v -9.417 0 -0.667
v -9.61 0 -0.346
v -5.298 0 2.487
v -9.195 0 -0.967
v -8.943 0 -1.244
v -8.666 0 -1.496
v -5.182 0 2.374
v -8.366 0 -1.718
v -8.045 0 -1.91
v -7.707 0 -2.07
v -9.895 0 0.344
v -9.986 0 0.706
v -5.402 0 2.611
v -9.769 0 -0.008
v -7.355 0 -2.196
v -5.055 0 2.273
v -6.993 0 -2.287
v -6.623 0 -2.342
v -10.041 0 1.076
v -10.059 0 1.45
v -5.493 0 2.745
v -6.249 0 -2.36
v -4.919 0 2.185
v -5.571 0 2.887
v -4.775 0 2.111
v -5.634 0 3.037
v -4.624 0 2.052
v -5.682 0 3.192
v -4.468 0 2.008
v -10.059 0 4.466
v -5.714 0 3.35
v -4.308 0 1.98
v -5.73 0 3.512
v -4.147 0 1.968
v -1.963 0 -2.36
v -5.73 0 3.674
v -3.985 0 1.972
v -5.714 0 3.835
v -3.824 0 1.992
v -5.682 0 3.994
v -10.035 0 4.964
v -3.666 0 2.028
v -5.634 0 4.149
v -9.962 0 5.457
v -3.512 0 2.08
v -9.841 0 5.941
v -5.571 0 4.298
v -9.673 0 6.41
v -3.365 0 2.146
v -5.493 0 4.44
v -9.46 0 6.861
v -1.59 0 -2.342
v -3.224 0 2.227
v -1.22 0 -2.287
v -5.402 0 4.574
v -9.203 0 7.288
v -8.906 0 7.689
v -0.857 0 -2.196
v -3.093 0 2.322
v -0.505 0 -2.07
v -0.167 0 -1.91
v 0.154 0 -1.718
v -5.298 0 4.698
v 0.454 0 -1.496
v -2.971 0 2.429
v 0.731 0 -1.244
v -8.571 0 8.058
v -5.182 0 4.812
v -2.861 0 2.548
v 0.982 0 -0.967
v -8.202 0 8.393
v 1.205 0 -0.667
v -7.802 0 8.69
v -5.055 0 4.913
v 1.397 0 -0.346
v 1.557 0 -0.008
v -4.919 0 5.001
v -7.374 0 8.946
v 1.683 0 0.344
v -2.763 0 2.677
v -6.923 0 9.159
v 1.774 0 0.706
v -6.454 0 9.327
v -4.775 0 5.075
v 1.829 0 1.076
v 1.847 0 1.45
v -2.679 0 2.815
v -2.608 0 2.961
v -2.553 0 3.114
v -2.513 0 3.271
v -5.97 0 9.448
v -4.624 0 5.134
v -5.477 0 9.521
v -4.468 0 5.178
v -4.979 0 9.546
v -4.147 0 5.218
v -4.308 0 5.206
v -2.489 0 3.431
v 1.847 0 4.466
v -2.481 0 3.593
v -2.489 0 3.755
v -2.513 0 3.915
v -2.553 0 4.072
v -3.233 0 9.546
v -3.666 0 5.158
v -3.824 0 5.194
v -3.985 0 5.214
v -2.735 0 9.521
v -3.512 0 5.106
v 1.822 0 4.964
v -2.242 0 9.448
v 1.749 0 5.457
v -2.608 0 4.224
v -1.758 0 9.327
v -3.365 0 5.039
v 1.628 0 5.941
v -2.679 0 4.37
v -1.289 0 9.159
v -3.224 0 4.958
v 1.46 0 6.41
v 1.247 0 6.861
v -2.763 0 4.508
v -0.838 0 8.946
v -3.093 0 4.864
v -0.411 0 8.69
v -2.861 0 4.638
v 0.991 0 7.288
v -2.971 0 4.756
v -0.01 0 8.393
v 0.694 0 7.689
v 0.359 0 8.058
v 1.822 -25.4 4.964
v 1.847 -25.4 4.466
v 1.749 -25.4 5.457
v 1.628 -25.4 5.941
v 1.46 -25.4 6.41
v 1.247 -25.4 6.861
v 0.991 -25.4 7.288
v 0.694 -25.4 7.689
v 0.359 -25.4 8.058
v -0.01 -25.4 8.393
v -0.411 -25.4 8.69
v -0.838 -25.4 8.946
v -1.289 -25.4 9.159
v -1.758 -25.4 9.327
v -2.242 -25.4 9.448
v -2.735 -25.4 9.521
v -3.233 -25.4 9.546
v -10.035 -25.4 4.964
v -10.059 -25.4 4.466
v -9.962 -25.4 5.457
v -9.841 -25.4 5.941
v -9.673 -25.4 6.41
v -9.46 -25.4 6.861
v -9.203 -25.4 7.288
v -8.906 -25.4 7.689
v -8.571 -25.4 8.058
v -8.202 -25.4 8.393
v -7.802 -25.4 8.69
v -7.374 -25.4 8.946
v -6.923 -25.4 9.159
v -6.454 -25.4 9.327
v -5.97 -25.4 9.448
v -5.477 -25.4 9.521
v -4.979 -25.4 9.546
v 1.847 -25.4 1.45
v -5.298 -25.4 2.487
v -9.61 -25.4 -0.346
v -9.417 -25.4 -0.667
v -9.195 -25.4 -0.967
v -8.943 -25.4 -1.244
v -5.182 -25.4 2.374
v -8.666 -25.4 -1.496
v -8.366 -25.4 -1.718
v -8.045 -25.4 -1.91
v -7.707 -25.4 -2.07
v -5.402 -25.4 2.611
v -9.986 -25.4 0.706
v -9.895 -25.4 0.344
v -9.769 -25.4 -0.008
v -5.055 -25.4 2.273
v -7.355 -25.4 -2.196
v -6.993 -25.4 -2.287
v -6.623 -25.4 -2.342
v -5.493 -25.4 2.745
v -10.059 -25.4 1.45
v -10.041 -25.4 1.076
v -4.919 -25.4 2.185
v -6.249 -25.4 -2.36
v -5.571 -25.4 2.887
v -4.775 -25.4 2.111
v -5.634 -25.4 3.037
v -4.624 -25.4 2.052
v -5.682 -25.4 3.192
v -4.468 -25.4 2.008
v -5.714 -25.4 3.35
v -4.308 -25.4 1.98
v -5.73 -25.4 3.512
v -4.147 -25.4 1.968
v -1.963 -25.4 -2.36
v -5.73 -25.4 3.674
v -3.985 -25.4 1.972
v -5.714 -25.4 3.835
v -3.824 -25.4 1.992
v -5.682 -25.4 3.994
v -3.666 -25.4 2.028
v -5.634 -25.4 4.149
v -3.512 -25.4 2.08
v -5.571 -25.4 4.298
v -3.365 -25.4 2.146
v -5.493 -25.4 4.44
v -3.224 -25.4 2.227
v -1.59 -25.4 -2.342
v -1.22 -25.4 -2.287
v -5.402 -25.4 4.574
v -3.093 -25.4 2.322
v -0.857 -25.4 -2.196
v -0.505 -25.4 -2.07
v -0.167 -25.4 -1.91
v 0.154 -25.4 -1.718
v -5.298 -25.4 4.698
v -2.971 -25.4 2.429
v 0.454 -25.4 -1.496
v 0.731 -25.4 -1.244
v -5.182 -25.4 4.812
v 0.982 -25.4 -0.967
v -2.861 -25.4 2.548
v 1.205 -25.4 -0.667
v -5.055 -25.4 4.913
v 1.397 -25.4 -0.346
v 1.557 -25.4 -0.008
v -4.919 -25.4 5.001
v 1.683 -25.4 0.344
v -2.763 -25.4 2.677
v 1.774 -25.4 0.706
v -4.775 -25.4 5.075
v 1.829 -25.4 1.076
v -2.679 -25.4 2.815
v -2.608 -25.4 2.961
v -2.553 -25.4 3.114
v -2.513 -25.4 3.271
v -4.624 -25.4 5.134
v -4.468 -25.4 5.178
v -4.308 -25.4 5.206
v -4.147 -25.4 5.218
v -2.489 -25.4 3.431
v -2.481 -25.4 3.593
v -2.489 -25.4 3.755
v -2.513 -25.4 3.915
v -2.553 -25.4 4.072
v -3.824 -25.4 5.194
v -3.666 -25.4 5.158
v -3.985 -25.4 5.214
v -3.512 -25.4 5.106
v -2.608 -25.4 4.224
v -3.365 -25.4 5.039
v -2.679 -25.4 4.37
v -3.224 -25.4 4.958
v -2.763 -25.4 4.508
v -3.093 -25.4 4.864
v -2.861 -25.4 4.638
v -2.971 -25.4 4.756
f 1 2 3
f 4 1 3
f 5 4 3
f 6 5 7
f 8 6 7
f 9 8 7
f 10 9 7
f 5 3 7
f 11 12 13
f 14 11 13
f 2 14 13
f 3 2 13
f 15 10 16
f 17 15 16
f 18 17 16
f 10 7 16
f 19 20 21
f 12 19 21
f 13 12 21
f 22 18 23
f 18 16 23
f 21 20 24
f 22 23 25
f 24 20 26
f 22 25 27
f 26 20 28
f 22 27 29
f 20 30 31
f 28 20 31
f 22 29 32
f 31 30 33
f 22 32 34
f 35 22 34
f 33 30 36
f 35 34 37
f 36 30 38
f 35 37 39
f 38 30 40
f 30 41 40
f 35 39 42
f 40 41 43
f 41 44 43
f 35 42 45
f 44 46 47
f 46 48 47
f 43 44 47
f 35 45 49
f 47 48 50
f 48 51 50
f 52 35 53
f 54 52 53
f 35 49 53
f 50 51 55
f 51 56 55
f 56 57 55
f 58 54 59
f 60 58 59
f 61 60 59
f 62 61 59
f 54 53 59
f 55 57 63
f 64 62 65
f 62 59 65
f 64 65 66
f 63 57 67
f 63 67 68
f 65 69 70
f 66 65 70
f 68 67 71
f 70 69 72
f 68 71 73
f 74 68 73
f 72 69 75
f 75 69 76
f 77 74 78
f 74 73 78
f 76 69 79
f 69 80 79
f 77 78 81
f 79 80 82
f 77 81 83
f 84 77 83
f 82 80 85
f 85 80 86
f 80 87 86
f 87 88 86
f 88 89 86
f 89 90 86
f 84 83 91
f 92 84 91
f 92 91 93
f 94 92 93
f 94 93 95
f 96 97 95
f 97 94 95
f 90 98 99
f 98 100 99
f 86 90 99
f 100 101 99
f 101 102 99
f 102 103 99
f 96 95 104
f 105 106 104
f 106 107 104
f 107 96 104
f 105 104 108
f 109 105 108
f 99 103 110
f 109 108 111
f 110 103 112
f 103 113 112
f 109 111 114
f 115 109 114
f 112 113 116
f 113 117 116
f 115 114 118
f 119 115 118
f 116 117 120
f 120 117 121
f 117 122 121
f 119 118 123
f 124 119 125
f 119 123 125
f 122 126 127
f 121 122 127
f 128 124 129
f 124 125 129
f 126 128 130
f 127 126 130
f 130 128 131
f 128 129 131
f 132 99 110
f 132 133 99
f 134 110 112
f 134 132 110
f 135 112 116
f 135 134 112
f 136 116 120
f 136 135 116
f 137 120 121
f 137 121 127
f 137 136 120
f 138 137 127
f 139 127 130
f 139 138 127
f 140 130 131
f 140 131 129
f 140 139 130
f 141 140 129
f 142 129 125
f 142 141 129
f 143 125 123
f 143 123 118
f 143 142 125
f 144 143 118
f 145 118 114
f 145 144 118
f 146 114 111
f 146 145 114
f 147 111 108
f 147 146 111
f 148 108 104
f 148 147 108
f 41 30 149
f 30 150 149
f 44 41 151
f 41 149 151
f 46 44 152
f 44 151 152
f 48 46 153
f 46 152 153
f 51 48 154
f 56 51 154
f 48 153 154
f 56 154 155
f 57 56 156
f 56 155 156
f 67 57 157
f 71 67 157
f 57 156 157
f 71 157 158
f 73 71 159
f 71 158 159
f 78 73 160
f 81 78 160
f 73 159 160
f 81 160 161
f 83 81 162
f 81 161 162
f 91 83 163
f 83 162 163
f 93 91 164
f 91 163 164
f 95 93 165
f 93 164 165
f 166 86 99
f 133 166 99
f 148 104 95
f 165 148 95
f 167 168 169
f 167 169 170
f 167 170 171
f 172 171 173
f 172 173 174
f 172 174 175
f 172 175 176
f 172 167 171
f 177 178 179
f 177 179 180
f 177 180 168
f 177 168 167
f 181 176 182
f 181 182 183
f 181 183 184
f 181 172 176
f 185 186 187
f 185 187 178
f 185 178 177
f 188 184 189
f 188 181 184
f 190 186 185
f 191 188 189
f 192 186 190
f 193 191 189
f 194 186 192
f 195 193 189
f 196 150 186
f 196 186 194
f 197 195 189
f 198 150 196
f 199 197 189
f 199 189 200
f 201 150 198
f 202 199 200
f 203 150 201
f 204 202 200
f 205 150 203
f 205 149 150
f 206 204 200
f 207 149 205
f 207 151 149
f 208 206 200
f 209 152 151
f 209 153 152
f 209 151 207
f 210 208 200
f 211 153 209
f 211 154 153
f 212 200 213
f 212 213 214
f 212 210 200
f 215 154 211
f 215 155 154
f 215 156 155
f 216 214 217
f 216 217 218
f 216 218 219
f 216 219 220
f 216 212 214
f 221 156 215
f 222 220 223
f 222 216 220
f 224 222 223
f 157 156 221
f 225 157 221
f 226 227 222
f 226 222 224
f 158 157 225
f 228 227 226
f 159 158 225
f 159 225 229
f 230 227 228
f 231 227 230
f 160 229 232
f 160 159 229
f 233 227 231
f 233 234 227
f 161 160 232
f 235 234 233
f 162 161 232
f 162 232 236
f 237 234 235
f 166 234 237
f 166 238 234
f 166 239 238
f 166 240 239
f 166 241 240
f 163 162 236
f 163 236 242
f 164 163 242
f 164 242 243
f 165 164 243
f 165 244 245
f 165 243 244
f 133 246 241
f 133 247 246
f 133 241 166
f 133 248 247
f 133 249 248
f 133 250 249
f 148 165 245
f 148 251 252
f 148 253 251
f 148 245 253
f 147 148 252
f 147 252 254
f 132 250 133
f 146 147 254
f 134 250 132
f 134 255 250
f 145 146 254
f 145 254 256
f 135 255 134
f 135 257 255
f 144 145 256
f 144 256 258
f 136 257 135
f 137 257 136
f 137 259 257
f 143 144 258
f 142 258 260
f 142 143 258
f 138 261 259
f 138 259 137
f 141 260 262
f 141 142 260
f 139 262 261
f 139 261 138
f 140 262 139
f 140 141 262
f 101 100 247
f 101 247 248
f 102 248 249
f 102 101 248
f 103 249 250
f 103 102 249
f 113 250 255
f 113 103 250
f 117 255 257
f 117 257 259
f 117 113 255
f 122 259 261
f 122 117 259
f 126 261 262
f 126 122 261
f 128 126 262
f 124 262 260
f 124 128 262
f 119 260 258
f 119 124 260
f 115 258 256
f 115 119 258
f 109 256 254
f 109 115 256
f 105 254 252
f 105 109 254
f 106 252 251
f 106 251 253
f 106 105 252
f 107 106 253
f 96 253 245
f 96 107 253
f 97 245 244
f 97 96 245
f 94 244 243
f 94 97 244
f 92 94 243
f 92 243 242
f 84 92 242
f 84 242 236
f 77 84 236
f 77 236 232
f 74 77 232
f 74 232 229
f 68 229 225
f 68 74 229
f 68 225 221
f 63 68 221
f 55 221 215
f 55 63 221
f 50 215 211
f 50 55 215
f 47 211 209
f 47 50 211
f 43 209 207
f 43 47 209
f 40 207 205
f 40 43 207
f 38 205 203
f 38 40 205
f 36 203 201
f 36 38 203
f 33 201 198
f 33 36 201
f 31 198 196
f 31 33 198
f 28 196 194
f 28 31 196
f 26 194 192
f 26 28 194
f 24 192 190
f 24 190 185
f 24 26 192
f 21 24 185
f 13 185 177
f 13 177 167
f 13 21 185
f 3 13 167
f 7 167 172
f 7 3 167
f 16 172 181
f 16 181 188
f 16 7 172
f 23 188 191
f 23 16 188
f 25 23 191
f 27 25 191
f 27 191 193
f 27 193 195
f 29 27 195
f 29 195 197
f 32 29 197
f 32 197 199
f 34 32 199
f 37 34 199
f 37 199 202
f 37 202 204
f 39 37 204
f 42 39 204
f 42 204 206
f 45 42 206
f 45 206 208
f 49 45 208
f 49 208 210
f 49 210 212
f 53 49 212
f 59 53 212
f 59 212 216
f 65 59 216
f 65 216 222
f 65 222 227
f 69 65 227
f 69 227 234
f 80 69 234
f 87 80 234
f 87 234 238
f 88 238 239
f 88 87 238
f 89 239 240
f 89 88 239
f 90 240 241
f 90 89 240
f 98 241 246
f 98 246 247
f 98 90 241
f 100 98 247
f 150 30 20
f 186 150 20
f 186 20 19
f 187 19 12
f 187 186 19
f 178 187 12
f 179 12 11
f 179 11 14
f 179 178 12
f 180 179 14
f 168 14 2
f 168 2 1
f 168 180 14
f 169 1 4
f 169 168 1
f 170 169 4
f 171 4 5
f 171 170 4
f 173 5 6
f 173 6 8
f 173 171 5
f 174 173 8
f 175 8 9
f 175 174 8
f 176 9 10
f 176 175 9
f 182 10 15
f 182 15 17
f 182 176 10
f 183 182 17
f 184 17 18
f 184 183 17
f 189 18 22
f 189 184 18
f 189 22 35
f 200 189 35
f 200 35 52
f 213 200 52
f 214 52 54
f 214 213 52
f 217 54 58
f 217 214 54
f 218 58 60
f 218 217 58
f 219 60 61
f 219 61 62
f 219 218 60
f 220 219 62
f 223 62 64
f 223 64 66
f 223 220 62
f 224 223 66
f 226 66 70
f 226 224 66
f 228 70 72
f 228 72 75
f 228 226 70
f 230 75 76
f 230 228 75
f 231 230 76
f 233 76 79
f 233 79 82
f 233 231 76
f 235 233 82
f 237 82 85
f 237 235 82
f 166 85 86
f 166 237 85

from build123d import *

# Parameters (mm, degrees)
F0_R     = 1.6256
F1_DEPTH = 25.4
F2_R     = 5.08
F3_R     = 3.81


with BuildPart() as f1:
    # F0 (on Front) → F1 (new body)
    with BuildSketch(Plane.XZ):
        with BuildLine():
            Line((-10.059392821, 9.5458903177), (-10.059392821, 3.5927653177))
            ThreePointArc((-10.059392821, 3.5927653177), (-8.3157628778, 7.8022603745), (-4.106267821, 9.5458903177))
            Line((-4.106267821, 9.5458903177), (-10.059392821, 9.5458903177))
        make_face()
        with BuildLine():
            ThreePointArc((-4.106267821, 9.5458903177), (-8.3157628778, 7.8022603745), (-10.059392821, 3.5927653177))
            ThreePointArc((-10.059392821, 3.5927653177), (-8.3157628778, -0.616729739), (-4.106267821, -2.3603596823))
            ThreePointArc((-4.106267821, -2.3603596823), (0.1032272357, -0.616729739), (1.846857179, 3.5927653177))
            ThreePointArc((1.846857179, 3.5927653177), (0.1032272357, 7.8022603745), (-4.106267821, 9.5458903177))
        make_face()
        with Locations((-4.106267821, 3.5927653177)):
            Circle(F0_R, mode=Mode.SUBTRACT)
        with BuildLine():
            Line((1.846857179, 9.5458903177), (-4.106267821, 9.5458903177))
            ThreePointArc((-4.106267821, 9.5458903177), (0.1032272357, 7.8022603745), (1.846857179, 3.5927653177))
            Line((1.846857179, 3.5927653177), (1.846857179, 9.5458903177))
        make_face()
        with BuildLine():
            ThreePointArc((1.846857179, 3.5927653177), (0.1032272357, -0.616729739), (-4.106267821, -2.3603596823))
            Line((-4.106267821, -2.3603596823), (1.846857179, -2.3603596823))
            Line((1.846857179, -2.3603596823), (1.846857179, 3.5927653177))
        make_face()
        with BuildLine():
            ThreePointArc((-4.106267821, -2.3603596823), (-8.3157628778, -0.616729739), (-10.059392821, 3.5927653177))
            Line((-10.059392821, 3.5927653177), (-10.059392821, -2.3603596823))
            Line((-10.059392821, -2.3603596823), (-4.106267821, -2.3603596823))
        make_face()
    extrude(amount=F1_DEPTH)

    # F2
    f2_edges = [f1.edges().sort_by_distance(p)[0] for p in [
        (1.846857, -12.7, 9.54589),
        (-10.059393, -12.7, 9.54589),
    ]]
    fillet(f2_edges, radius=F2_R)

    # F3
    f3_edges = [f1.edges().sort_by_distance(p)[0] for p in [
        (-10.059393, -12.7, -2.36036),
        (1.846857, -12.7, -2.36036),
    ]]
    fillet(f3_edges, radius=F3_R)


solid = f1.part
